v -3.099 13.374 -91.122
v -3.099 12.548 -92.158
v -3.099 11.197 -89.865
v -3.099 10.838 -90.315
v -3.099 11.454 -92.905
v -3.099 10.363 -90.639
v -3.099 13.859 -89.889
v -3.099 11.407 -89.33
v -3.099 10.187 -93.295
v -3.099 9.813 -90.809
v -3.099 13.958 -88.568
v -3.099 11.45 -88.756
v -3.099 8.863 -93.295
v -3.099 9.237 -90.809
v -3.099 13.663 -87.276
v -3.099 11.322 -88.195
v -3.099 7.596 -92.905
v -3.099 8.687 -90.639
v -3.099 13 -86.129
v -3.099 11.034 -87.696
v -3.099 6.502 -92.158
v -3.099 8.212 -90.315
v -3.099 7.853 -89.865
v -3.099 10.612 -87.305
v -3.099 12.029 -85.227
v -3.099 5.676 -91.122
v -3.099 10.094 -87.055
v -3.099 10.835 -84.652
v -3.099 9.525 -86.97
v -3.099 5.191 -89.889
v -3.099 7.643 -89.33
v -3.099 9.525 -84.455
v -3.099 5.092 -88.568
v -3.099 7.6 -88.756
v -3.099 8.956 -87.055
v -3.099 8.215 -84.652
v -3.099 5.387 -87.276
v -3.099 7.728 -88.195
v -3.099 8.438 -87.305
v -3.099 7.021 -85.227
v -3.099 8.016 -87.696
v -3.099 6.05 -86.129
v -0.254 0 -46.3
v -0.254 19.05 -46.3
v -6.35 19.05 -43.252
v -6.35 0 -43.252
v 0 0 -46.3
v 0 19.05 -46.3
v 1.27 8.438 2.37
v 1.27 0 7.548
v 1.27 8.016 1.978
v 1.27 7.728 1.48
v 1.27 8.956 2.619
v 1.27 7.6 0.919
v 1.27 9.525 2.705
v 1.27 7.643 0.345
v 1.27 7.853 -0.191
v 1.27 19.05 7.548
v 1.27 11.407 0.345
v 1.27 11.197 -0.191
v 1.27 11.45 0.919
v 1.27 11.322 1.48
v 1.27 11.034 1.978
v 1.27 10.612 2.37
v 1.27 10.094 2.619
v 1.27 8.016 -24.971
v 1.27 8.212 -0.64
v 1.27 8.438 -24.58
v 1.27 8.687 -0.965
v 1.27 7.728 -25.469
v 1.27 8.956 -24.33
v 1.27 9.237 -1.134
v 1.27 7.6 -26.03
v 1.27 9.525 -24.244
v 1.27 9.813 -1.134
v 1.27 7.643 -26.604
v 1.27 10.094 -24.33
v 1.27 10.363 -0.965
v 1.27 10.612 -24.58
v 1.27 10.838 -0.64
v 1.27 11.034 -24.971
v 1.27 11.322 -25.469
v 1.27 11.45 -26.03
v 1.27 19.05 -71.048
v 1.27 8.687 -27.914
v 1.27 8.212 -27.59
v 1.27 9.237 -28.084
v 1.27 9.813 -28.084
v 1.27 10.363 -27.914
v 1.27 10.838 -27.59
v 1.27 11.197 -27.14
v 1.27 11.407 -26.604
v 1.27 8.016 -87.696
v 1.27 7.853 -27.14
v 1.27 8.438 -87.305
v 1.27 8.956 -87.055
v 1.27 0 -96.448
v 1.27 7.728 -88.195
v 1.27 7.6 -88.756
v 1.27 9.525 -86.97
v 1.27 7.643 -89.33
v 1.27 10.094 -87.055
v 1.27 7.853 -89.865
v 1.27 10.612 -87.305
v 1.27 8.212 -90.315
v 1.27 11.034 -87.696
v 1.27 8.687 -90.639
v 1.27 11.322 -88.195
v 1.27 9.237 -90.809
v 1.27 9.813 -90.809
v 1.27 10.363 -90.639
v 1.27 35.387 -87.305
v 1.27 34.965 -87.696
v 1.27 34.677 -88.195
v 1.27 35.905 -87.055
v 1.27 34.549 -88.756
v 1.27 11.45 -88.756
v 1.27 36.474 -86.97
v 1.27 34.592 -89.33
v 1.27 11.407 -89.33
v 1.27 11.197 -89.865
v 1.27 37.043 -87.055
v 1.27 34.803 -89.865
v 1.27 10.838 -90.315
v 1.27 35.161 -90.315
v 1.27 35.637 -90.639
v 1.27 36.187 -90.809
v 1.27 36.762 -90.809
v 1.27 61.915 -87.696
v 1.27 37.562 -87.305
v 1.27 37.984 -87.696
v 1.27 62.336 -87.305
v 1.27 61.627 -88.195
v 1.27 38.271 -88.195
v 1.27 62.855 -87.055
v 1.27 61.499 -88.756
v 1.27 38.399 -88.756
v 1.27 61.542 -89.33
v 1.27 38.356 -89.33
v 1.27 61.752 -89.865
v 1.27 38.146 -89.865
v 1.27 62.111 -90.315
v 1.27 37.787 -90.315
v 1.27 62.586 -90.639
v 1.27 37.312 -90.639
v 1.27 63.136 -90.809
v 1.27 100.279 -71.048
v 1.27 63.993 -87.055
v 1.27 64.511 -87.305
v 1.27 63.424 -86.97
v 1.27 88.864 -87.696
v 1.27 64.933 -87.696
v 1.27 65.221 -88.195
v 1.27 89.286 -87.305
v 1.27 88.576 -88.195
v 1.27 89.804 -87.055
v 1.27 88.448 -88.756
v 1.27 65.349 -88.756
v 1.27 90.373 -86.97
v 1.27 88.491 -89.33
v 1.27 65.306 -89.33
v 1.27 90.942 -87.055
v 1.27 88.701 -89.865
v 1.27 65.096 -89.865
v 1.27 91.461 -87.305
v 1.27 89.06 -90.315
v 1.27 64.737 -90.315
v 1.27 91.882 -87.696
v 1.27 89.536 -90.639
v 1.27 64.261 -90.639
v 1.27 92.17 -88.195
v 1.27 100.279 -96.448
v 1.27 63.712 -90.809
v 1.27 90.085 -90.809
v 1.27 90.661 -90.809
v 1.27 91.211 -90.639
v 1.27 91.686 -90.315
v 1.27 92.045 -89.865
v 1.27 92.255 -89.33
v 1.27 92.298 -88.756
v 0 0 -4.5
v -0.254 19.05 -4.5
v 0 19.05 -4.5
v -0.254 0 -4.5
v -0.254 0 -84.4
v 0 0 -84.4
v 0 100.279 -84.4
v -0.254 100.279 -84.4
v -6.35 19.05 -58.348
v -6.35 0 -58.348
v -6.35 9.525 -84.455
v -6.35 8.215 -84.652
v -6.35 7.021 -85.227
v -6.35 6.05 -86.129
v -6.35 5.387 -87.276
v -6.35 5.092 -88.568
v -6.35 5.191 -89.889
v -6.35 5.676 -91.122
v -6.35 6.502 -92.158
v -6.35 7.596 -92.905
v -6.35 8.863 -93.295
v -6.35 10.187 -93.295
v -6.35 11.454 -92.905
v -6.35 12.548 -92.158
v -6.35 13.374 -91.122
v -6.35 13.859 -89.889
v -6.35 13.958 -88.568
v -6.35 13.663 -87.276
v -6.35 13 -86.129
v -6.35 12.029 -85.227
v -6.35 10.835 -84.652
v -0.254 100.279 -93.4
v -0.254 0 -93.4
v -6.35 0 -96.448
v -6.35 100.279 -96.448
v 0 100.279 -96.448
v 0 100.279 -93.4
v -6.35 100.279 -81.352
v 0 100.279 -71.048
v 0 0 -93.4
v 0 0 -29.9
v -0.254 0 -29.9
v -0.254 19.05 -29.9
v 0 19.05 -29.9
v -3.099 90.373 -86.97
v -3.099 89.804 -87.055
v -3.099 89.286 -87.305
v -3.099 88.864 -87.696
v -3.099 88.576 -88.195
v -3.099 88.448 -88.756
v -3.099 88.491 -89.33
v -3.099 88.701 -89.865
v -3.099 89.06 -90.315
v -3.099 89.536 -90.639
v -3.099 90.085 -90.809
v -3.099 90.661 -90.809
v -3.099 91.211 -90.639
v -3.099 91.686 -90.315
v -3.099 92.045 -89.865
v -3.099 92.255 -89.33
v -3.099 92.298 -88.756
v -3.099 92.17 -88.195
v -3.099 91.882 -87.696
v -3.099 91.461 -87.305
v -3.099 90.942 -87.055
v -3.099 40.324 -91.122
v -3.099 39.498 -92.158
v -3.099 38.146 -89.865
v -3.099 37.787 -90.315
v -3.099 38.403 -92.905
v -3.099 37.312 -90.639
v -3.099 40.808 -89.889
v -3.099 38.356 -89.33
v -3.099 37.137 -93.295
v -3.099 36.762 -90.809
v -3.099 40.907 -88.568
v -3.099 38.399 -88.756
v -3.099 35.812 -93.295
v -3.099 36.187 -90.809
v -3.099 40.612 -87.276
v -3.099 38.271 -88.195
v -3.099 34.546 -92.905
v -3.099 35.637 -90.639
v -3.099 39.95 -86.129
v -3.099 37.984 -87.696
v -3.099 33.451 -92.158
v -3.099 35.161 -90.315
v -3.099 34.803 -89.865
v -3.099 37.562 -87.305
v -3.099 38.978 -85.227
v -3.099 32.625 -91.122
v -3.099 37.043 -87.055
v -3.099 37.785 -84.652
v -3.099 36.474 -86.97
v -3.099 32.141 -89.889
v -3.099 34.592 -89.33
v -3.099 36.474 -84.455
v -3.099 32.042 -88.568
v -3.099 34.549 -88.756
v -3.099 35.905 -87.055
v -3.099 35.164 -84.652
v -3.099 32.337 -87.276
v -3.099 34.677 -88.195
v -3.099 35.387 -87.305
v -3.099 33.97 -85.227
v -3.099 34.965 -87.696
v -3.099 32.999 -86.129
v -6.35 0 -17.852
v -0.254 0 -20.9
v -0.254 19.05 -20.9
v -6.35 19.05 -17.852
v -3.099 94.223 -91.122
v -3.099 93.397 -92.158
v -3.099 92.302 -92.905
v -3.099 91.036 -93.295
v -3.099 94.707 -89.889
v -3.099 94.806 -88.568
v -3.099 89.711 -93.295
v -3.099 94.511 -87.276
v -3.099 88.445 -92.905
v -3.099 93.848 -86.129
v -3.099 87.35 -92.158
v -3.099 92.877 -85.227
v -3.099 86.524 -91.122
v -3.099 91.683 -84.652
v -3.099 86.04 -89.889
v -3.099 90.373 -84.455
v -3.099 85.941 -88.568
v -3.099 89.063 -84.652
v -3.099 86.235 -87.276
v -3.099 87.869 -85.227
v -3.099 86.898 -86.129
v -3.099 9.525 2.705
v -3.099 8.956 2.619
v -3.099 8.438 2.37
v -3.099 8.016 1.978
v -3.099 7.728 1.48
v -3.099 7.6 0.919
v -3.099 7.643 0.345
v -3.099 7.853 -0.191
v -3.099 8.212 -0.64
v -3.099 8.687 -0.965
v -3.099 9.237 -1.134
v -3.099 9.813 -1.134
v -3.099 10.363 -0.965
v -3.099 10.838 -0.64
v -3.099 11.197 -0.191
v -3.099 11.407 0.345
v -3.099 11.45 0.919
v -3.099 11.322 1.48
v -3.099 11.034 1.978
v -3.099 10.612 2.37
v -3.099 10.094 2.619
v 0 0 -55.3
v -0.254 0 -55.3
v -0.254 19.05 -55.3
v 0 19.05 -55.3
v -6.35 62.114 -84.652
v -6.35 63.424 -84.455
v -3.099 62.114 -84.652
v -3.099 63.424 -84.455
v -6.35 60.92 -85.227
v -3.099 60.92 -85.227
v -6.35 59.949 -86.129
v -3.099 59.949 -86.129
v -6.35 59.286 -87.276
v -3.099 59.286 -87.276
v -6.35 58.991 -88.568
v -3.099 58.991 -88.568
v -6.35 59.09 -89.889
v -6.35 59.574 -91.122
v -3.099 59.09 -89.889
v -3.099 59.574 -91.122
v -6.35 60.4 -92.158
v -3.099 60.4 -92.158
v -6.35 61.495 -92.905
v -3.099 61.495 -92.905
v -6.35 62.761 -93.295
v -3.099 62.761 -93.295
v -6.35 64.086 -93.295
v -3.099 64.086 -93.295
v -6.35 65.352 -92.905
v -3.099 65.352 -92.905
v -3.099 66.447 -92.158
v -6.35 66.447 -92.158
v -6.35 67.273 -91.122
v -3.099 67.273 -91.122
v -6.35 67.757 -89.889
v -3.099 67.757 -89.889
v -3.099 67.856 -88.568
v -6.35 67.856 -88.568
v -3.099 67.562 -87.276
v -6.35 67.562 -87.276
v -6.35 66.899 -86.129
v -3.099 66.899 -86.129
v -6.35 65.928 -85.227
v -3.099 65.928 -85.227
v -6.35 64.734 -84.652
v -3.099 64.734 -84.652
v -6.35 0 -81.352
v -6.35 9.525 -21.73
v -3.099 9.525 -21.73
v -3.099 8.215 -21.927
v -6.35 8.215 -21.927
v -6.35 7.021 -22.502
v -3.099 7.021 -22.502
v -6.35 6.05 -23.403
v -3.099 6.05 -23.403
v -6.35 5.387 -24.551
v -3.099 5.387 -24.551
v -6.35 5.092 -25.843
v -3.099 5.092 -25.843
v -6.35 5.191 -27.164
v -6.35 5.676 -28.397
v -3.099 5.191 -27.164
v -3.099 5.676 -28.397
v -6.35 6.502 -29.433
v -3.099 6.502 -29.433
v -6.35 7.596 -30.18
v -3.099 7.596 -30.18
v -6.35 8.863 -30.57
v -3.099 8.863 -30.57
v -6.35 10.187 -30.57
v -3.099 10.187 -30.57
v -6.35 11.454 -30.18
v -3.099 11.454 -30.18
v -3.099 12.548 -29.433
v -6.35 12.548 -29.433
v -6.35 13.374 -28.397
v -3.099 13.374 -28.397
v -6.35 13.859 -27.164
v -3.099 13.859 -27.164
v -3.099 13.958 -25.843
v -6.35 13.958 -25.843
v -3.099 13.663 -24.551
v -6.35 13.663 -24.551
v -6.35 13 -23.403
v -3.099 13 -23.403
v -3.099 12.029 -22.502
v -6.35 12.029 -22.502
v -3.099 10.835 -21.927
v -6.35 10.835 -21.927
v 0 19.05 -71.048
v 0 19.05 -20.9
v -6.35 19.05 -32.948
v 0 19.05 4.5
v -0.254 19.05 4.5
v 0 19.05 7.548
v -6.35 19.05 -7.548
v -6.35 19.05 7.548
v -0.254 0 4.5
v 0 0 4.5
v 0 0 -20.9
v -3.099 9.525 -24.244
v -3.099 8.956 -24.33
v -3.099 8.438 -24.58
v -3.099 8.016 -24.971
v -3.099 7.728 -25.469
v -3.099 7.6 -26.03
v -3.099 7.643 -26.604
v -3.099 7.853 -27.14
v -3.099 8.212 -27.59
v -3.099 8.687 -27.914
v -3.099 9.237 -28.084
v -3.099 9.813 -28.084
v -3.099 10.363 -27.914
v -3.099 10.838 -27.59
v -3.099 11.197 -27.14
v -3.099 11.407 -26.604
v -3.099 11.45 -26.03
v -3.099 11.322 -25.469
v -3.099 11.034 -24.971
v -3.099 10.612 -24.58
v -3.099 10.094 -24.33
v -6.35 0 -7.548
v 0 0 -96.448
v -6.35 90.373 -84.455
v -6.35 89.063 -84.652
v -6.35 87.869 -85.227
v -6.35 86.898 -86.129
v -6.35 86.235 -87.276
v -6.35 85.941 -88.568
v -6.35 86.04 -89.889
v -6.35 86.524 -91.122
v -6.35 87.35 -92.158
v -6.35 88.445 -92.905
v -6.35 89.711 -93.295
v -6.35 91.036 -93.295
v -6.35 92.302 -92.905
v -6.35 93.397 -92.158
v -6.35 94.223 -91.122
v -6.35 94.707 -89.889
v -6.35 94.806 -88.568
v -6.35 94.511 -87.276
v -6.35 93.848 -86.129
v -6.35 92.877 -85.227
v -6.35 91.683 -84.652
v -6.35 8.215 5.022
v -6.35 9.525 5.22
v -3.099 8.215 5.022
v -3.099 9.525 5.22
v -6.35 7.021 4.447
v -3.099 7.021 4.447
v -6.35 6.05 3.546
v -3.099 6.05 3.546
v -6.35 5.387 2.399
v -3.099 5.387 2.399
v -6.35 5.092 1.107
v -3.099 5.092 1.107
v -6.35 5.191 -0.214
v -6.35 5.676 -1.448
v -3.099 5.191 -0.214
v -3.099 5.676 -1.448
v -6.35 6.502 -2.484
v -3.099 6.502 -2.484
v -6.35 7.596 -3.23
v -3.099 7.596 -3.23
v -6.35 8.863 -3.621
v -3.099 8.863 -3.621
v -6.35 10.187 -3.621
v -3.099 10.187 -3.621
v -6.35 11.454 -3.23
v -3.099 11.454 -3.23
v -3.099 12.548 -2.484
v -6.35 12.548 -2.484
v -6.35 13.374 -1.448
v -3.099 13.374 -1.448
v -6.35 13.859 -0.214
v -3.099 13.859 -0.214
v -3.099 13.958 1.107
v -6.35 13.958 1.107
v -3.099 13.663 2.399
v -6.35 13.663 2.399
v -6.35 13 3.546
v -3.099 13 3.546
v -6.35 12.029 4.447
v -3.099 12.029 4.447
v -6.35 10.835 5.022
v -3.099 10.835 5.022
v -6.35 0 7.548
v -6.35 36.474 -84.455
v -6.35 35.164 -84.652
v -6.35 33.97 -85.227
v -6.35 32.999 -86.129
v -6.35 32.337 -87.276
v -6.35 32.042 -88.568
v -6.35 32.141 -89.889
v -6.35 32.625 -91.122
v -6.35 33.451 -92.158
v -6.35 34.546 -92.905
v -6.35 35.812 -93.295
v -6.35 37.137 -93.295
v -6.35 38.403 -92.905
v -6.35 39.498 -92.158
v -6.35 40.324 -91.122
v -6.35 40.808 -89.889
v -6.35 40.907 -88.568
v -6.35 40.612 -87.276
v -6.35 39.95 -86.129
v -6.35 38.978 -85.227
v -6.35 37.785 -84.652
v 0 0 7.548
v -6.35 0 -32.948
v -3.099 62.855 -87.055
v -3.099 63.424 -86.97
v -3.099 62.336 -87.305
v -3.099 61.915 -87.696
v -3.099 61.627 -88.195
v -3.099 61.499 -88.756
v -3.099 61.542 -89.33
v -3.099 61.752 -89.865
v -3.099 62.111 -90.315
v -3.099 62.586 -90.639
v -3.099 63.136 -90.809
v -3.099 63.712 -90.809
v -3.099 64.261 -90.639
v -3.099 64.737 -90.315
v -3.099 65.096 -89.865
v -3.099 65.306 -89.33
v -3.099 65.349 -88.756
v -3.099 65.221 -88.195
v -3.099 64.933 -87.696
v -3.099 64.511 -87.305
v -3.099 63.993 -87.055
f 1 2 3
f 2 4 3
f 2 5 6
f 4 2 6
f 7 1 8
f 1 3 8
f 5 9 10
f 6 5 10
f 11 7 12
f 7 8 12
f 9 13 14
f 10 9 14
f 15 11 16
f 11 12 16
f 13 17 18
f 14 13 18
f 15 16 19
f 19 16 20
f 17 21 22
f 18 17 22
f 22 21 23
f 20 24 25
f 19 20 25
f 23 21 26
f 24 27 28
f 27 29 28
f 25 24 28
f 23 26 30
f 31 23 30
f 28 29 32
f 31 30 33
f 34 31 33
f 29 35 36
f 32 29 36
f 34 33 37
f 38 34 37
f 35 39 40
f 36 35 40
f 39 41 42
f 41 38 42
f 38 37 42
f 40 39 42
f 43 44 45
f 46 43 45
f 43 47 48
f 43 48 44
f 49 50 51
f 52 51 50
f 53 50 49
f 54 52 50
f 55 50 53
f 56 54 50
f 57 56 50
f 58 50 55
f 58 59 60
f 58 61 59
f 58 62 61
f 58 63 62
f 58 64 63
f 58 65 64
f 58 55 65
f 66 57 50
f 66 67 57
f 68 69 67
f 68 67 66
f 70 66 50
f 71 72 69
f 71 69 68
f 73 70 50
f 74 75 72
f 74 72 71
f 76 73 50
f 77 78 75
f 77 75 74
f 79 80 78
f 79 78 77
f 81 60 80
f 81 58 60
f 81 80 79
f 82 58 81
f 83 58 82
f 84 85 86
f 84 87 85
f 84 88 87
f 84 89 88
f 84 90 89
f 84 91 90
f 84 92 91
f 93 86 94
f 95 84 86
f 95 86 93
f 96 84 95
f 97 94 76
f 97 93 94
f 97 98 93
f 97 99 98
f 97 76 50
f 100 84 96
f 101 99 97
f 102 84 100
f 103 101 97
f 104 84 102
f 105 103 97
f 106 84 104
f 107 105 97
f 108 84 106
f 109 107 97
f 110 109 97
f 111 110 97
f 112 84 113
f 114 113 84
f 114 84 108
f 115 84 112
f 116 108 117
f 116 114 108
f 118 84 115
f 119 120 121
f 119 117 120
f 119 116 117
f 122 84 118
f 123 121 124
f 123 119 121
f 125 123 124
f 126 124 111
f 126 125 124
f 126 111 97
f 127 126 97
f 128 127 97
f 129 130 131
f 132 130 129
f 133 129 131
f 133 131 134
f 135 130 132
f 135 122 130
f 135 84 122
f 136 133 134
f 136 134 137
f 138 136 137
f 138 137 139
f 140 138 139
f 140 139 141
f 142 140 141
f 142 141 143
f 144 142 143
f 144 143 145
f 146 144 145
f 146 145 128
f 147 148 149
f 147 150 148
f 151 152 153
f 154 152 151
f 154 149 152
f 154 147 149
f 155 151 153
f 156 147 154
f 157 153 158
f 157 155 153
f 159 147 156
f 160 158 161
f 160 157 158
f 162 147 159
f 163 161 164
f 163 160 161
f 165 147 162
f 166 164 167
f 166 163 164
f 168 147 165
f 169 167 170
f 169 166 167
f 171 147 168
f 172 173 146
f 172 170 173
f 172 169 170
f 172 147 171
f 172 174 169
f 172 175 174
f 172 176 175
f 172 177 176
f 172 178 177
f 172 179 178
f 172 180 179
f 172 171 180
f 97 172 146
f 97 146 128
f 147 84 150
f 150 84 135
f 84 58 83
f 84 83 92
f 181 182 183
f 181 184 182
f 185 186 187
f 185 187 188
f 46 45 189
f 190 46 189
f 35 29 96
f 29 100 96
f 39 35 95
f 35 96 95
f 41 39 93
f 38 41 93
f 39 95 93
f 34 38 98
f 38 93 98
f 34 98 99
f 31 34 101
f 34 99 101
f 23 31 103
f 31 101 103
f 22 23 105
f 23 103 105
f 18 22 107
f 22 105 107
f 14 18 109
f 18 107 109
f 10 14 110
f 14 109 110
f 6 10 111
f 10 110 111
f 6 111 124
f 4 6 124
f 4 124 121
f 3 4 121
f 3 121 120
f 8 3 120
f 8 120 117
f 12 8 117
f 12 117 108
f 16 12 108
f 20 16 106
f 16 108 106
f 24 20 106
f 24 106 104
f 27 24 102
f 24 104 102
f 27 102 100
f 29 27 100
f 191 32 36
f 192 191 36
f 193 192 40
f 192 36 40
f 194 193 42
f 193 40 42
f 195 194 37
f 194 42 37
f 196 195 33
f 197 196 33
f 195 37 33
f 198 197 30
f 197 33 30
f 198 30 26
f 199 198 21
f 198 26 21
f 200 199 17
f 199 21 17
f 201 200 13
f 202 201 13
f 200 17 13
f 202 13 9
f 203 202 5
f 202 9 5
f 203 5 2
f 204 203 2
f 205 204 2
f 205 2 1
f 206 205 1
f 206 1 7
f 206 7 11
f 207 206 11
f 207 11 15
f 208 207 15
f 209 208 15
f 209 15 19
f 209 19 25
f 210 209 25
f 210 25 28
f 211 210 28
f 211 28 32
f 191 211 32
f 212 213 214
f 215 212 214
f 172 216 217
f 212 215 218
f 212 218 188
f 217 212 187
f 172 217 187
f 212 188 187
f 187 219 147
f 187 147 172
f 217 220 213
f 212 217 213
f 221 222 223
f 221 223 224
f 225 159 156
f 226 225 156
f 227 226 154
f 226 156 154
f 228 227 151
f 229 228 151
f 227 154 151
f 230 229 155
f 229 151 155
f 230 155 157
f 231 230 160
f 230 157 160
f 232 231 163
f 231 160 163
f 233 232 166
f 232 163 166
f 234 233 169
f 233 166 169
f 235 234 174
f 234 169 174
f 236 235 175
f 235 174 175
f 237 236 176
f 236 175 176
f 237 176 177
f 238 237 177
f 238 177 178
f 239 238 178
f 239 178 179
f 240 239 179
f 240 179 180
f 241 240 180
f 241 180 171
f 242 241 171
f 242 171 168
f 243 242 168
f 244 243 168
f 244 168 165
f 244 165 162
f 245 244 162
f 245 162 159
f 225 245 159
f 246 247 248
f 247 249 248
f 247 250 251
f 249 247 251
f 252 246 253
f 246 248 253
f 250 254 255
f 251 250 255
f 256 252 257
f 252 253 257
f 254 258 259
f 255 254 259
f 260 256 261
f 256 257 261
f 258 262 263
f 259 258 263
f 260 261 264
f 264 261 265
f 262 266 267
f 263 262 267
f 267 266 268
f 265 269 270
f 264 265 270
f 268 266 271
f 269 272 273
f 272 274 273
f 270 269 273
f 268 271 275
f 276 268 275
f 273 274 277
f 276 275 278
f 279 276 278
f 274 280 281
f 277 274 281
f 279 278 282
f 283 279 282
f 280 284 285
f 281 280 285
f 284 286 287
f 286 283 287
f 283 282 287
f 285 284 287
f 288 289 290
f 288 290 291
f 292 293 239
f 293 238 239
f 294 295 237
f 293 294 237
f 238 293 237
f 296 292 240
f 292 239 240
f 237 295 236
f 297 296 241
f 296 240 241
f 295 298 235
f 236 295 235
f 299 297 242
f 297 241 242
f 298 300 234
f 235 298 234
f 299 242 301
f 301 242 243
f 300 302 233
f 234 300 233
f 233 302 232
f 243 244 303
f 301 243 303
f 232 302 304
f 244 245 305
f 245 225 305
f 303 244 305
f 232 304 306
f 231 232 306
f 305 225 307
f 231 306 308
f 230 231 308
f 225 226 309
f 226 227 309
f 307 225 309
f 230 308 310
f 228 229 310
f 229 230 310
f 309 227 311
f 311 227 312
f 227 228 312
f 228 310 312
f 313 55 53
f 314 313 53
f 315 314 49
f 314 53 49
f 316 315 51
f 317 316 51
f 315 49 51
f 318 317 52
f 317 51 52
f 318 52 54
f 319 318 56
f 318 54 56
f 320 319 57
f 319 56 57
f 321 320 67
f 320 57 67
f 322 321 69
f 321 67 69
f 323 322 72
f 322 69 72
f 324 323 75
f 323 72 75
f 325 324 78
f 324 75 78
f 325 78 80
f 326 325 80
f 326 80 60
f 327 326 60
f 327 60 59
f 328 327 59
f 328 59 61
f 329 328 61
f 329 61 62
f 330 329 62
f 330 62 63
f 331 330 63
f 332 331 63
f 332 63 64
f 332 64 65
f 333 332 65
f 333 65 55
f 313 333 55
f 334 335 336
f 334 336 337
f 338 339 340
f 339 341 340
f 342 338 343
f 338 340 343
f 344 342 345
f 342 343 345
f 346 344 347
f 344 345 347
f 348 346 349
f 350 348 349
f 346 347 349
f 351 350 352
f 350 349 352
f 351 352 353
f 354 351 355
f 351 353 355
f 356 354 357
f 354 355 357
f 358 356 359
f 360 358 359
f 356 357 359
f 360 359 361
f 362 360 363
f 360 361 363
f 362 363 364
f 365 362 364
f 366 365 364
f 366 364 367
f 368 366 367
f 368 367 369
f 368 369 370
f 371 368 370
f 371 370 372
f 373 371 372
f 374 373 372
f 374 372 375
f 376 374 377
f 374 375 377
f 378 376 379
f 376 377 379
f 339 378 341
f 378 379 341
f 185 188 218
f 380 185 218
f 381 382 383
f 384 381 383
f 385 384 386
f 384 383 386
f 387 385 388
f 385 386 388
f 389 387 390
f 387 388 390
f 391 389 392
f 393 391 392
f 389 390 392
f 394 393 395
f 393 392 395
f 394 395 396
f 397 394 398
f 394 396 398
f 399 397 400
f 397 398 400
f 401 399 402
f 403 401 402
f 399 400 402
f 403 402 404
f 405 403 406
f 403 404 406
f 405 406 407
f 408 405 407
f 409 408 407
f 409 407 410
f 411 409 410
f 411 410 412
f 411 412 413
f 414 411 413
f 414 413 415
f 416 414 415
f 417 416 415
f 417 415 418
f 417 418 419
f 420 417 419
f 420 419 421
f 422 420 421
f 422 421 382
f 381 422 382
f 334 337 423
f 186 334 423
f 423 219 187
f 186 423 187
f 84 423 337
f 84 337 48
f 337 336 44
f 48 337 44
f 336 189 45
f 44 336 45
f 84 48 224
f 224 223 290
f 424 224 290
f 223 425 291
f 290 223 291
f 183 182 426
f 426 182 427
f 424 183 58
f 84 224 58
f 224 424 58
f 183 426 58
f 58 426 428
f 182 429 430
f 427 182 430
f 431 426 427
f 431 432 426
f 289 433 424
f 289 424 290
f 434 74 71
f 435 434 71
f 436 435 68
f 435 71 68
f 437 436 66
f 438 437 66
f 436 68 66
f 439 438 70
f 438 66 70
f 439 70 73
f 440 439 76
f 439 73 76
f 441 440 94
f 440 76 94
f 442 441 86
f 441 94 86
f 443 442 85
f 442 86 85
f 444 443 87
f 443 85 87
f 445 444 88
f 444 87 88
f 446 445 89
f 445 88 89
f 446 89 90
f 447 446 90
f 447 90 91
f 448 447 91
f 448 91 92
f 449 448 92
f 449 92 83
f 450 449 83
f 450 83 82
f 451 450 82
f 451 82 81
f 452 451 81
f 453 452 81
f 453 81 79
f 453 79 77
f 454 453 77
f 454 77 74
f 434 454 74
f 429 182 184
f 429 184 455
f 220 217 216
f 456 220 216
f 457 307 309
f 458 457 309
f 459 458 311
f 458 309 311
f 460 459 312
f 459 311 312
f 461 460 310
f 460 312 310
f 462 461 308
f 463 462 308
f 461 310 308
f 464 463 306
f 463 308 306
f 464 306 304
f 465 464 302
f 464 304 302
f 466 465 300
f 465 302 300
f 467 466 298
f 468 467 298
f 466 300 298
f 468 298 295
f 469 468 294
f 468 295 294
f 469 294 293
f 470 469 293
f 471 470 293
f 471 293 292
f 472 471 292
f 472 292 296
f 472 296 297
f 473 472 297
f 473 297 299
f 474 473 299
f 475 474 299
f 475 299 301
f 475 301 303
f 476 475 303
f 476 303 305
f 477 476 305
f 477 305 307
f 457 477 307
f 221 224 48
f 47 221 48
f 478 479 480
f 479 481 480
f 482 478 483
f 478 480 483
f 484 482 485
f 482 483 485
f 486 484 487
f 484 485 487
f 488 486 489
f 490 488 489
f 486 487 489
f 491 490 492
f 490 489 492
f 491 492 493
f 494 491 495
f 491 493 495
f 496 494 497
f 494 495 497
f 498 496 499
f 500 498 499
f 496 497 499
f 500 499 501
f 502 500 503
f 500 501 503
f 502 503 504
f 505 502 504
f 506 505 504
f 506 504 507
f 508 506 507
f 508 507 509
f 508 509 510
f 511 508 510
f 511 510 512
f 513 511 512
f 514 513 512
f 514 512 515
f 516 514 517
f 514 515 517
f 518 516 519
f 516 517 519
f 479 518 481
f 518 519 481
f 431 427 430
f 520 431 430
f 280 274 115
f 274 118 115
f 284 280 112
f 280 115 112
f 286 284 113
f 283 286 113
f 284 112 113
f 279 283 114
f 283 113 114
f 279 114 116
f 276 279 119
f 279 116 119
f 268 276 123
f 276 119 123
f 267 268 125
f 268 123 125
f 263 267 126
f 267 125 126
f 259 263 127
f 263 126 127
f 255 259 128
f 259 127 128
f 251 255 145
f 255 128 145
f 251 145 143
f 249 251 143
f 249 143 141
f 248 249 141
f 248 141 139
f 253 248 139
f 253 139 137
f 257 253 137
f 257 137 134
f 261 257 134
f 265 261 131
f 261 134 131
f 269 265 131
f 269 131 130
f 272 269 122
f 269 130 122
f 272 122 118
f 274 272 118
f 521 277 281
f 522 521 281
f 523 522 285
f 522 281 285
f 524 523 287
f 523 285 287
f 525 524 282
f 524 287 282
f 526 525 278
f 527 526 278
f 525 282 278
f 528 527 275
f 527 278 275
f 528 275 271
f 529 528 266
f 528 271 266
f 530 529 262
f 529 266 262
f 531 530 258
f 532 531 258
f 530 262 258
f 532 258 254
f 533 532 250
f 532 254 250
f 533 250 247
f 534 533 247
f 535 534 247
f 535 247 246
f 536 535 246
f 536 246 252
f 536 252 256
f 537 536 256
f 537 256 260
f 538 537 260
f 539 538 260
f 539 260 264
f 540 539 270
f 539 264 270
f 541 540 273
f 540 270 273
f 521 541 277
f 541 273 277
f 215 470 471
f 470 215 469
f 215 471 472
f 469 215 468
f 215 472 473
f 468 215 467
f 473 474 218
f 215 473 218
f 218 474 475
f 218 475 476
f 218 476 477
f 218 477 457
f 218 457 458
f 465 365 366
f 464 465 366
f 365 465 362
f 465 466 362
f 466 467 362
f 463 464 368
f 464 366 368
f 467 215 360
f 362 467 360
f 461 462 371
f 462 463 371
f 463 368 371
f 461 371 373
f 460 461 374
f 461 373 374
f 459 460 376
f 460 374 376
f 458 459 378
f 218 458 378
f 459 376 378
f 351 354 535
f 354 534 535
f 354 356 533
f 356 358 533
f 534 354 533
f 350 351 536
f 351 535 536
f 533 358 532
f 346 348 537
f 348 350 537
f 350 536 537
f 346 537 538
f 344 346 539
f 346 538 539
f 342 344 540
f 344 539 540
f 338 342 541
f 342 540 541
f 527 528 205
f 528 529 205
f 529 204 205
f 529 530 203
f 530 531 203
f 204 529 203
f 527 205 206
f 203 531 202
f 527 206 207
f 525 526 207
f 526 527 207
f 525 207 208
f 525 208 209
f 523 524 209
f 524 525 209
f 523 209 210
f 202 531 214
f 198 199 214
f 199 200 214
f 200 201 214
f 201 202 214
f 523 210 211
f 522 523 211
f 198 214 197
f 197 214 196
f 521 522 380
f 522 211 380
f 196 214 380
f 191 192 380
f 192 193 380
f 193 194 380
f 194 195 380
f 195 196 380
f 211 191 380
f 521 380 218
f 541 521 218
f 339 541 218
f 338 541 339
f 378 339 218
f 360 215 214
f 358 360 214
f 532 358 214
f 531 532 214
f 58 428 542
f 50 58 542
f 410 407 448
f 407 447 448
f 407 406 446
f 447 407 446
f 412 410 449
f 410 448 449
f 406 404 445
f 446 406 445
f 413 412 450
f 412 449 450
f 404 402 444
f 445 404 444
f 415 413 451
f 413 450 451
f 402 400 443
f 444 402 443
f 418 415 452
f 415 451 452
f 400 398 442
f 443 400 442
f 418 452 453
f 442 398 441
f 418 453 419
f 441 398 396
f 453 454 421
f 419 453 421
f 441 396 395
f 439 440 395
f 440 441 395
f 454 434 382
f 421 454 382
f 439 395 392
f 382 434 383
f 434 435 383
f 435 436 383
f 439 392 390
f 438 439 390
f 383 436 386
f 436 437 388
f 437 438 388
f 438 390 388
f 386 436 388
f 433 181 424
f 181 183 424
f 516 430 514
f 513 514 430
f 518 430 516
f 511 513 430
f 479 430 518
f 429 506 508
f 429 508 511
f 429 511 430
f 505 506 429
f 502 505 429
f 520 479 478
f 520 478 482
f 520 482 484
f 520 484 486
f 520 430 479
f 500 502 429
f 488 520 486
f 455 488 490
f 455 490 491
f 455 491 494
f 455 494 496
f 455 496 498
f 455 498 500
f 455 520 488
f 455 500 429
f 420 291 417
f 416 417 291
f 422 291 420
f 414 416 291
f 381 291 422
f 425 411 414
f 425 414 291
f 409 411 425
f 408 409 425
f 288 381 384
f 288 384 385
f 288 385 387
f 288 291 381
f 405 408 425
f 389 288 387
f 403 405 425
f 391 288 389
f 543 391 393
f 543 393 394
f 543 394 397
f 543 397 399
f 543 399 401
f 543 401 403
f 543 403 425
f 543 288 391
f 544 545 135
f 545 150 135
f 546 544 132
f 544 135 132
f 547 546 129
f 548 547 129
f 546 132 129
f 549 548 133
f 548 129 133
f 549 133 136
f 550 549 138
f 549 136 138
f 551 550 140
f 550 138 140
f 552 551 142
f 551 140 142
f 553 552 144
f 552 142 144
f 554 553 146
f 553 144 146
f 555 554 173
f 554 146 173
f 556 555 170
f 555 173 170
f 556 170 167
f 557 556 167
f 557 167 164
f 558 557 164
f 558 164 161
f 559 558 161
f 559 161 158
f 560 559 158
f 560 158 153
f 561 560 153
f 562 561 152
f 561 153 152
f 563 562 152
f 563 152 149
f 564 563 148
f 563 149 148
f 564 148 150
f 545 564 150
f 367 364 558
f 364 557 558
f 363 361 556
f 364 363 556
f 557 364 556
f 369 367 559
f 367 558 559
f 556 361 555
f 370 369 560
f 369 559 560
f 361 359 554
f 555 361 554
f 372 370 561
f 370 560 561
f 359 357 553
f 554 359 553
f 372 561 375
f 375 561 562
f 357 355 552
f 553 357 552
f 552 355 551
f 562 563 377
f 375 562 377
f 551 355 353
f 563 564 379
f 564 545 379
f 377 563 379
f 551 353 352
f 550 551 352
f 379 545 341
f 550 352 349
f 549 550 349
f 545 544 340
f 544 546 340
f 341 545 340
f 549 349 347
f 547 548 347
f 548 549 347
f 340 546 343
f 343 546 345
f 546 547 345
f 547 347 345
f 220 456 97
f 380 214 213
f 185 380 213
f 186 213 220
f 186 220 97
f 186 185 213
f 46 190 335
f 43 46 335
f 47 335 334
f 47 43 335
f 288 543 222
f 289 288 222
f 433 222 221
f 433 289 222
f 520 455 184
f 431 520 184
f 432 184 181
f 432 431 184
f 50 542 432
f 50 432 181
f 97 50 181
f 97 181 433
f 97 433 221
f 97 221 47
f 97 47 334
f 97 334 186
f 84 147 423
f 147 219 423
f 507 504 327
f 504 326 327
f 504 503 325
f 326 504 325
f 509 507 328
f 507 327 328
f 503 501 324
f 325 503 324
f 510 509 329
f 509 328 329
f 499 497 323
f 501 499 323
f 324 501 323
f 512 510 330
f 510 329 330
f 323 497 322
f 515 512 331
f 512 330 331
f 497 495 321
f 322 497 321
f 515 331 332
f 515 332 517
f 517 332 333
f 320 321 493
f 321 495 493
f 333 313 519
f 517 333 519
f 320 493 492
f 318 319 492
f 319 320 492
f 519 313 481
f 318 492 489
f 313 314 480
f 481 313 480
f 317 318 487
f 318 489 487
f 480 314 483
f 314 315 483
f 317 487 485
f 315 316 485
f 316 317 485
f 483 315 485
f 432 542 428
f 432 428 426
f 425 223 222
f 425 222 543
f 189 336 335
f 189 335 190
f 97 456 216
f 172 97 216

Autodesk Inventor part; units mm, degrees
ref_plane "YZ Plane" through (0, 0, 0) normal (1, 0, 0) x (0, 1, 0)
ref_plane "XY Plane" through (0, 0, 0) normal (0, 0, 1) x (1, 0, 0)
sketch "Sketch1" plane through (0, 0, 0) normal (0, 1, 0) x (-1, 0, 0)
  line L0 (0, 4.5) -> (0.254, 4.5)
  line L1 (0.254, -4.5) -> (0, -4.5)
  line L2 (6.35, 4.5) -> (6.35, -4.5)
  line L3 (6.35, 7.548) -> (6.35, 4.5)
  line L4 (6.35, -7.548) -> (6.35, -4.5)
  line L5 (0.254, 4.5) -> (6.35, 7.548)
  line L6 (0.254, -4.5) -> (6.35, -7.548)
  line L7 (0, 4.5) -> (0, -4.5)
  line L8 (0, -20.9) -> (0.254, -20.9)
  line L9 (0.254, -29.9) -> (0, -29.9)
  line L10 (6.35, -20.9) -> (6.35, -29.9)
  line L11 (6.35, -17.852) -> (6.35, -20.9)
  line L12 (6.35, -32.948) -> (6.35, -29.9)
  line L13 (0.254, -20.9) -> (6.35, -17.852)
  line L14 (0.254, -29.9) -> (6.35, -32.948)
  line L15 (0, -20.9) -> (0, -29.9)
  line L16 (0, -46.3) -> (0.254, -46.3)
  line L17 (0.254, -55.3) -> (0, -55.3)
  line L18 (6.35, -46.3) -> (6.35, -55.3)
  line L19 (6.35, -43.252) -> (6.35, -46.3)
  line L20 (6.35, -58.348) -> (6.35, -55.3)
  line L21 (0.254, -46.3) -> (6.35, -43.252)
  line L22 (0.254, -55.3) -> (6.35, -58.348)
  line L23 (0, -46.3) -> (0, -55.3)
  line L24 (0, -71.7) -> (0.254, -71.7)
  line L25 (0.254, -80.7) -> (0, -80.7)
  line L26 (6.35, -71.7) -> (6.35, -80.7)
  line L27 (6.35, -68.652) -> (6.35, -71.7)
  line L28 (6.35, -83.748) -> (6.35, -80.7)
  line L29 (0.254, -71.7) -> (6.35, -68.652)
  line L30 (0.254, -80.7) -> (6.35, -83.748)
  line L31 (0, -71.7) -> (0, -80.7)
  point P0 (0, 0)
  dimension "d16" = 6.096
  dimension "d25" = 9
  dimension "d26" = 3.048
  dimension "d27" = 3.048
  dimension "d28" = 0.254
  dimension "d29" = 0.254
  dimension "d33" = 25.4
extrude "Shape" add sketch "Sketch1" along normal blind 19.05 contours L0 L5 L3 L2 L4 L6 L1 L7 | L8 L13 L11 L10 L12 L14 L9 L15 | L16 L21 L19 L18 L20 L22 L17 L23
sketch "Sketch4" plane through (0, 0, 0) normal (0, -1, 0) x (1, 0, 0)
  line L0 (0, -55.3) -> (-0.254, -55.3) construction
  line L1 (0, -46.3) -> (0, -55.3) construction
  line L2 (-6.35, -43.252) -> (-0.254, -46.3) construction
  line L3 (-6.35, -58.348) -> (-6.35, -43.252) construction
  line L4 (-0.254, -55.3) -> (-6.35, -58.348) construction
  line L5 (-0.254, -46.3) -> (0, -46.3) construction
  line L6 (0, -84.4) -> (-0.254, -84.4)
  line L7 (-0.254, -84.4) -> (-6.35, -81.352)
  line L8 (-6.35, -96.448) -> (-6.35, -81.352)
  line L9 (-0.254, -55.3) -> (-6.35, -58.348) projected
  line L10 (-0.254, -93.4) -> (-6.35, -96.448)
  line L11 (0, -93.4) -> (-0.254, -93.4)
  line L12 (0, -93.4) -> (0, -84.4)
  line L13 (-0.254, -46.3) -> (0, -46.3) projected
  line L14 (0, -46.3) -> (0, -55.3) projected
  point P0 (0, 0)
  dimension "d81" = 38.1
extrude "Extrusion4" add sketch "Sketch4" against normal blind 100.2792
sketch "Sketch5" plane through (0, 0, -84.4) normal (1, 0, 0) x (0, 0, -1)
  line L0 (12.048, 0) -> (12.048, 100.2792) construction
  line L1 (0, 100.2792) -> (9, 100.2792) construction
  line L2 (-91.948, 0) -> (-91.948, 19.05) construction
  line L3 (-76.852, 0) -> (-91.948, 0) projected
  line L4 (12.048, 0) -> (9, 0) projected
  line L5 (-91.948, 0) -> (12.048, 0)
  line L6 (9, 100.2792) -> (12.048, 100.2792) projected
  line L7 (12.048, 0) -> (12.048, 100.2792)
  line L8 (12.048, 100.2792) -> (-13.352, 100.2792)
  line L9 (-13.352, 100.2792) -> (-13.352, 19.05)
  line L10 (-29.1, 19.05) -> (-26.052, 19.05) projected
  line L11 (-76.852, 19.05) -> (-91.948, 19.05) projected
  line L12 (-13.352, 19.05) -> (-91.948, 19.05)
  line L13 (-91.948, 19.05) -> (-91.948, 0)
  point P0 (-84.4, 0)
  point P1 (-91.948, 100.2792)
  point P2 (9, 0)
  dimension "d46" = 25.4
extrude "Extrusion5" add sketch "Sketch5" along normal blind 1.27
sketch "Sketch6" plane through (-6.35, 0, -96.448) normal (-1, 0, 0) x (0, 0, 1)
  line L0 (0, 100.2792) -> (15.096, 100.2792) projected
  line L1 (7.548, 100.2792) -> (7.548, 0) construction
  line L2 (103.996, 0) -> (0, 0) projected
  circle A0 centre (7.548, 9.525) radius 1.9304
  circle A1 centre (7.548, 36.4744) radius 1.9304
  circle A2 centre (7.548, 63.4238) radius 1.9304
  circle A3 centre (7.548, 90.3732) radius 1.9304
  circle A4 centre (97.2227, 9.525) radius 1.9304
  circle A5 centre (70.2733, 9.525) radius 1.9304
  line L3 (103.996, 0) -> (103.996, 19.05) projected
  line L4 (25.4, 19.05) -> (103.996, 19.05) construction
  line L5 (96.448, 19.05) -> (96.448, 0) construction
  line L6 (63.5, 19.05) -> (78.596, 19.05) construction
  line L7 (71.048, 19.05) -> (71.048, 0) construction
  line L8 (63.5, 0) -> (78.596, 0) construction
  line L9 (63.5, 0) -> (63.5, 19.05) projected
  line L10 (78.596, 0) -> (78.596, 19.05) projected
  dimension "d54" = 26.9494
  dimension "d48" = 3.8608
  dimension "d51" = 26.9494
  dimension "d57" = 3.8608
  dimension "d60" = 26.9494
  dimension "d69" = 0.7747
hole "Hole1" at (-6.35, 90.3732, -88.9) at (-6.35, 63.4238, -88.9) at (-6.35, 36.4744, -88.9) at (-6.35, 9.525, -88.9) at (-6.35, 9.525, -26.1747) at (-6.35, 9.525, 0.7747) direction (1, 0, 0) diameter 3.8608 end through all counterbore diameter 8.89 counterbore depth 3.2512
ref_plane "Work Plane1" through (0, 9.525, 0) normal (0, 1, 0) x (-1, 0, 0)
ref_plane "Work Plane2" through (8.746, 0, -88.9) normal (0, 0, -1) x (0, 1, 0)
equation "\"d27\" = d26"
equation "\"d29\" = d28"
properties part number "Lift mount insert left"
